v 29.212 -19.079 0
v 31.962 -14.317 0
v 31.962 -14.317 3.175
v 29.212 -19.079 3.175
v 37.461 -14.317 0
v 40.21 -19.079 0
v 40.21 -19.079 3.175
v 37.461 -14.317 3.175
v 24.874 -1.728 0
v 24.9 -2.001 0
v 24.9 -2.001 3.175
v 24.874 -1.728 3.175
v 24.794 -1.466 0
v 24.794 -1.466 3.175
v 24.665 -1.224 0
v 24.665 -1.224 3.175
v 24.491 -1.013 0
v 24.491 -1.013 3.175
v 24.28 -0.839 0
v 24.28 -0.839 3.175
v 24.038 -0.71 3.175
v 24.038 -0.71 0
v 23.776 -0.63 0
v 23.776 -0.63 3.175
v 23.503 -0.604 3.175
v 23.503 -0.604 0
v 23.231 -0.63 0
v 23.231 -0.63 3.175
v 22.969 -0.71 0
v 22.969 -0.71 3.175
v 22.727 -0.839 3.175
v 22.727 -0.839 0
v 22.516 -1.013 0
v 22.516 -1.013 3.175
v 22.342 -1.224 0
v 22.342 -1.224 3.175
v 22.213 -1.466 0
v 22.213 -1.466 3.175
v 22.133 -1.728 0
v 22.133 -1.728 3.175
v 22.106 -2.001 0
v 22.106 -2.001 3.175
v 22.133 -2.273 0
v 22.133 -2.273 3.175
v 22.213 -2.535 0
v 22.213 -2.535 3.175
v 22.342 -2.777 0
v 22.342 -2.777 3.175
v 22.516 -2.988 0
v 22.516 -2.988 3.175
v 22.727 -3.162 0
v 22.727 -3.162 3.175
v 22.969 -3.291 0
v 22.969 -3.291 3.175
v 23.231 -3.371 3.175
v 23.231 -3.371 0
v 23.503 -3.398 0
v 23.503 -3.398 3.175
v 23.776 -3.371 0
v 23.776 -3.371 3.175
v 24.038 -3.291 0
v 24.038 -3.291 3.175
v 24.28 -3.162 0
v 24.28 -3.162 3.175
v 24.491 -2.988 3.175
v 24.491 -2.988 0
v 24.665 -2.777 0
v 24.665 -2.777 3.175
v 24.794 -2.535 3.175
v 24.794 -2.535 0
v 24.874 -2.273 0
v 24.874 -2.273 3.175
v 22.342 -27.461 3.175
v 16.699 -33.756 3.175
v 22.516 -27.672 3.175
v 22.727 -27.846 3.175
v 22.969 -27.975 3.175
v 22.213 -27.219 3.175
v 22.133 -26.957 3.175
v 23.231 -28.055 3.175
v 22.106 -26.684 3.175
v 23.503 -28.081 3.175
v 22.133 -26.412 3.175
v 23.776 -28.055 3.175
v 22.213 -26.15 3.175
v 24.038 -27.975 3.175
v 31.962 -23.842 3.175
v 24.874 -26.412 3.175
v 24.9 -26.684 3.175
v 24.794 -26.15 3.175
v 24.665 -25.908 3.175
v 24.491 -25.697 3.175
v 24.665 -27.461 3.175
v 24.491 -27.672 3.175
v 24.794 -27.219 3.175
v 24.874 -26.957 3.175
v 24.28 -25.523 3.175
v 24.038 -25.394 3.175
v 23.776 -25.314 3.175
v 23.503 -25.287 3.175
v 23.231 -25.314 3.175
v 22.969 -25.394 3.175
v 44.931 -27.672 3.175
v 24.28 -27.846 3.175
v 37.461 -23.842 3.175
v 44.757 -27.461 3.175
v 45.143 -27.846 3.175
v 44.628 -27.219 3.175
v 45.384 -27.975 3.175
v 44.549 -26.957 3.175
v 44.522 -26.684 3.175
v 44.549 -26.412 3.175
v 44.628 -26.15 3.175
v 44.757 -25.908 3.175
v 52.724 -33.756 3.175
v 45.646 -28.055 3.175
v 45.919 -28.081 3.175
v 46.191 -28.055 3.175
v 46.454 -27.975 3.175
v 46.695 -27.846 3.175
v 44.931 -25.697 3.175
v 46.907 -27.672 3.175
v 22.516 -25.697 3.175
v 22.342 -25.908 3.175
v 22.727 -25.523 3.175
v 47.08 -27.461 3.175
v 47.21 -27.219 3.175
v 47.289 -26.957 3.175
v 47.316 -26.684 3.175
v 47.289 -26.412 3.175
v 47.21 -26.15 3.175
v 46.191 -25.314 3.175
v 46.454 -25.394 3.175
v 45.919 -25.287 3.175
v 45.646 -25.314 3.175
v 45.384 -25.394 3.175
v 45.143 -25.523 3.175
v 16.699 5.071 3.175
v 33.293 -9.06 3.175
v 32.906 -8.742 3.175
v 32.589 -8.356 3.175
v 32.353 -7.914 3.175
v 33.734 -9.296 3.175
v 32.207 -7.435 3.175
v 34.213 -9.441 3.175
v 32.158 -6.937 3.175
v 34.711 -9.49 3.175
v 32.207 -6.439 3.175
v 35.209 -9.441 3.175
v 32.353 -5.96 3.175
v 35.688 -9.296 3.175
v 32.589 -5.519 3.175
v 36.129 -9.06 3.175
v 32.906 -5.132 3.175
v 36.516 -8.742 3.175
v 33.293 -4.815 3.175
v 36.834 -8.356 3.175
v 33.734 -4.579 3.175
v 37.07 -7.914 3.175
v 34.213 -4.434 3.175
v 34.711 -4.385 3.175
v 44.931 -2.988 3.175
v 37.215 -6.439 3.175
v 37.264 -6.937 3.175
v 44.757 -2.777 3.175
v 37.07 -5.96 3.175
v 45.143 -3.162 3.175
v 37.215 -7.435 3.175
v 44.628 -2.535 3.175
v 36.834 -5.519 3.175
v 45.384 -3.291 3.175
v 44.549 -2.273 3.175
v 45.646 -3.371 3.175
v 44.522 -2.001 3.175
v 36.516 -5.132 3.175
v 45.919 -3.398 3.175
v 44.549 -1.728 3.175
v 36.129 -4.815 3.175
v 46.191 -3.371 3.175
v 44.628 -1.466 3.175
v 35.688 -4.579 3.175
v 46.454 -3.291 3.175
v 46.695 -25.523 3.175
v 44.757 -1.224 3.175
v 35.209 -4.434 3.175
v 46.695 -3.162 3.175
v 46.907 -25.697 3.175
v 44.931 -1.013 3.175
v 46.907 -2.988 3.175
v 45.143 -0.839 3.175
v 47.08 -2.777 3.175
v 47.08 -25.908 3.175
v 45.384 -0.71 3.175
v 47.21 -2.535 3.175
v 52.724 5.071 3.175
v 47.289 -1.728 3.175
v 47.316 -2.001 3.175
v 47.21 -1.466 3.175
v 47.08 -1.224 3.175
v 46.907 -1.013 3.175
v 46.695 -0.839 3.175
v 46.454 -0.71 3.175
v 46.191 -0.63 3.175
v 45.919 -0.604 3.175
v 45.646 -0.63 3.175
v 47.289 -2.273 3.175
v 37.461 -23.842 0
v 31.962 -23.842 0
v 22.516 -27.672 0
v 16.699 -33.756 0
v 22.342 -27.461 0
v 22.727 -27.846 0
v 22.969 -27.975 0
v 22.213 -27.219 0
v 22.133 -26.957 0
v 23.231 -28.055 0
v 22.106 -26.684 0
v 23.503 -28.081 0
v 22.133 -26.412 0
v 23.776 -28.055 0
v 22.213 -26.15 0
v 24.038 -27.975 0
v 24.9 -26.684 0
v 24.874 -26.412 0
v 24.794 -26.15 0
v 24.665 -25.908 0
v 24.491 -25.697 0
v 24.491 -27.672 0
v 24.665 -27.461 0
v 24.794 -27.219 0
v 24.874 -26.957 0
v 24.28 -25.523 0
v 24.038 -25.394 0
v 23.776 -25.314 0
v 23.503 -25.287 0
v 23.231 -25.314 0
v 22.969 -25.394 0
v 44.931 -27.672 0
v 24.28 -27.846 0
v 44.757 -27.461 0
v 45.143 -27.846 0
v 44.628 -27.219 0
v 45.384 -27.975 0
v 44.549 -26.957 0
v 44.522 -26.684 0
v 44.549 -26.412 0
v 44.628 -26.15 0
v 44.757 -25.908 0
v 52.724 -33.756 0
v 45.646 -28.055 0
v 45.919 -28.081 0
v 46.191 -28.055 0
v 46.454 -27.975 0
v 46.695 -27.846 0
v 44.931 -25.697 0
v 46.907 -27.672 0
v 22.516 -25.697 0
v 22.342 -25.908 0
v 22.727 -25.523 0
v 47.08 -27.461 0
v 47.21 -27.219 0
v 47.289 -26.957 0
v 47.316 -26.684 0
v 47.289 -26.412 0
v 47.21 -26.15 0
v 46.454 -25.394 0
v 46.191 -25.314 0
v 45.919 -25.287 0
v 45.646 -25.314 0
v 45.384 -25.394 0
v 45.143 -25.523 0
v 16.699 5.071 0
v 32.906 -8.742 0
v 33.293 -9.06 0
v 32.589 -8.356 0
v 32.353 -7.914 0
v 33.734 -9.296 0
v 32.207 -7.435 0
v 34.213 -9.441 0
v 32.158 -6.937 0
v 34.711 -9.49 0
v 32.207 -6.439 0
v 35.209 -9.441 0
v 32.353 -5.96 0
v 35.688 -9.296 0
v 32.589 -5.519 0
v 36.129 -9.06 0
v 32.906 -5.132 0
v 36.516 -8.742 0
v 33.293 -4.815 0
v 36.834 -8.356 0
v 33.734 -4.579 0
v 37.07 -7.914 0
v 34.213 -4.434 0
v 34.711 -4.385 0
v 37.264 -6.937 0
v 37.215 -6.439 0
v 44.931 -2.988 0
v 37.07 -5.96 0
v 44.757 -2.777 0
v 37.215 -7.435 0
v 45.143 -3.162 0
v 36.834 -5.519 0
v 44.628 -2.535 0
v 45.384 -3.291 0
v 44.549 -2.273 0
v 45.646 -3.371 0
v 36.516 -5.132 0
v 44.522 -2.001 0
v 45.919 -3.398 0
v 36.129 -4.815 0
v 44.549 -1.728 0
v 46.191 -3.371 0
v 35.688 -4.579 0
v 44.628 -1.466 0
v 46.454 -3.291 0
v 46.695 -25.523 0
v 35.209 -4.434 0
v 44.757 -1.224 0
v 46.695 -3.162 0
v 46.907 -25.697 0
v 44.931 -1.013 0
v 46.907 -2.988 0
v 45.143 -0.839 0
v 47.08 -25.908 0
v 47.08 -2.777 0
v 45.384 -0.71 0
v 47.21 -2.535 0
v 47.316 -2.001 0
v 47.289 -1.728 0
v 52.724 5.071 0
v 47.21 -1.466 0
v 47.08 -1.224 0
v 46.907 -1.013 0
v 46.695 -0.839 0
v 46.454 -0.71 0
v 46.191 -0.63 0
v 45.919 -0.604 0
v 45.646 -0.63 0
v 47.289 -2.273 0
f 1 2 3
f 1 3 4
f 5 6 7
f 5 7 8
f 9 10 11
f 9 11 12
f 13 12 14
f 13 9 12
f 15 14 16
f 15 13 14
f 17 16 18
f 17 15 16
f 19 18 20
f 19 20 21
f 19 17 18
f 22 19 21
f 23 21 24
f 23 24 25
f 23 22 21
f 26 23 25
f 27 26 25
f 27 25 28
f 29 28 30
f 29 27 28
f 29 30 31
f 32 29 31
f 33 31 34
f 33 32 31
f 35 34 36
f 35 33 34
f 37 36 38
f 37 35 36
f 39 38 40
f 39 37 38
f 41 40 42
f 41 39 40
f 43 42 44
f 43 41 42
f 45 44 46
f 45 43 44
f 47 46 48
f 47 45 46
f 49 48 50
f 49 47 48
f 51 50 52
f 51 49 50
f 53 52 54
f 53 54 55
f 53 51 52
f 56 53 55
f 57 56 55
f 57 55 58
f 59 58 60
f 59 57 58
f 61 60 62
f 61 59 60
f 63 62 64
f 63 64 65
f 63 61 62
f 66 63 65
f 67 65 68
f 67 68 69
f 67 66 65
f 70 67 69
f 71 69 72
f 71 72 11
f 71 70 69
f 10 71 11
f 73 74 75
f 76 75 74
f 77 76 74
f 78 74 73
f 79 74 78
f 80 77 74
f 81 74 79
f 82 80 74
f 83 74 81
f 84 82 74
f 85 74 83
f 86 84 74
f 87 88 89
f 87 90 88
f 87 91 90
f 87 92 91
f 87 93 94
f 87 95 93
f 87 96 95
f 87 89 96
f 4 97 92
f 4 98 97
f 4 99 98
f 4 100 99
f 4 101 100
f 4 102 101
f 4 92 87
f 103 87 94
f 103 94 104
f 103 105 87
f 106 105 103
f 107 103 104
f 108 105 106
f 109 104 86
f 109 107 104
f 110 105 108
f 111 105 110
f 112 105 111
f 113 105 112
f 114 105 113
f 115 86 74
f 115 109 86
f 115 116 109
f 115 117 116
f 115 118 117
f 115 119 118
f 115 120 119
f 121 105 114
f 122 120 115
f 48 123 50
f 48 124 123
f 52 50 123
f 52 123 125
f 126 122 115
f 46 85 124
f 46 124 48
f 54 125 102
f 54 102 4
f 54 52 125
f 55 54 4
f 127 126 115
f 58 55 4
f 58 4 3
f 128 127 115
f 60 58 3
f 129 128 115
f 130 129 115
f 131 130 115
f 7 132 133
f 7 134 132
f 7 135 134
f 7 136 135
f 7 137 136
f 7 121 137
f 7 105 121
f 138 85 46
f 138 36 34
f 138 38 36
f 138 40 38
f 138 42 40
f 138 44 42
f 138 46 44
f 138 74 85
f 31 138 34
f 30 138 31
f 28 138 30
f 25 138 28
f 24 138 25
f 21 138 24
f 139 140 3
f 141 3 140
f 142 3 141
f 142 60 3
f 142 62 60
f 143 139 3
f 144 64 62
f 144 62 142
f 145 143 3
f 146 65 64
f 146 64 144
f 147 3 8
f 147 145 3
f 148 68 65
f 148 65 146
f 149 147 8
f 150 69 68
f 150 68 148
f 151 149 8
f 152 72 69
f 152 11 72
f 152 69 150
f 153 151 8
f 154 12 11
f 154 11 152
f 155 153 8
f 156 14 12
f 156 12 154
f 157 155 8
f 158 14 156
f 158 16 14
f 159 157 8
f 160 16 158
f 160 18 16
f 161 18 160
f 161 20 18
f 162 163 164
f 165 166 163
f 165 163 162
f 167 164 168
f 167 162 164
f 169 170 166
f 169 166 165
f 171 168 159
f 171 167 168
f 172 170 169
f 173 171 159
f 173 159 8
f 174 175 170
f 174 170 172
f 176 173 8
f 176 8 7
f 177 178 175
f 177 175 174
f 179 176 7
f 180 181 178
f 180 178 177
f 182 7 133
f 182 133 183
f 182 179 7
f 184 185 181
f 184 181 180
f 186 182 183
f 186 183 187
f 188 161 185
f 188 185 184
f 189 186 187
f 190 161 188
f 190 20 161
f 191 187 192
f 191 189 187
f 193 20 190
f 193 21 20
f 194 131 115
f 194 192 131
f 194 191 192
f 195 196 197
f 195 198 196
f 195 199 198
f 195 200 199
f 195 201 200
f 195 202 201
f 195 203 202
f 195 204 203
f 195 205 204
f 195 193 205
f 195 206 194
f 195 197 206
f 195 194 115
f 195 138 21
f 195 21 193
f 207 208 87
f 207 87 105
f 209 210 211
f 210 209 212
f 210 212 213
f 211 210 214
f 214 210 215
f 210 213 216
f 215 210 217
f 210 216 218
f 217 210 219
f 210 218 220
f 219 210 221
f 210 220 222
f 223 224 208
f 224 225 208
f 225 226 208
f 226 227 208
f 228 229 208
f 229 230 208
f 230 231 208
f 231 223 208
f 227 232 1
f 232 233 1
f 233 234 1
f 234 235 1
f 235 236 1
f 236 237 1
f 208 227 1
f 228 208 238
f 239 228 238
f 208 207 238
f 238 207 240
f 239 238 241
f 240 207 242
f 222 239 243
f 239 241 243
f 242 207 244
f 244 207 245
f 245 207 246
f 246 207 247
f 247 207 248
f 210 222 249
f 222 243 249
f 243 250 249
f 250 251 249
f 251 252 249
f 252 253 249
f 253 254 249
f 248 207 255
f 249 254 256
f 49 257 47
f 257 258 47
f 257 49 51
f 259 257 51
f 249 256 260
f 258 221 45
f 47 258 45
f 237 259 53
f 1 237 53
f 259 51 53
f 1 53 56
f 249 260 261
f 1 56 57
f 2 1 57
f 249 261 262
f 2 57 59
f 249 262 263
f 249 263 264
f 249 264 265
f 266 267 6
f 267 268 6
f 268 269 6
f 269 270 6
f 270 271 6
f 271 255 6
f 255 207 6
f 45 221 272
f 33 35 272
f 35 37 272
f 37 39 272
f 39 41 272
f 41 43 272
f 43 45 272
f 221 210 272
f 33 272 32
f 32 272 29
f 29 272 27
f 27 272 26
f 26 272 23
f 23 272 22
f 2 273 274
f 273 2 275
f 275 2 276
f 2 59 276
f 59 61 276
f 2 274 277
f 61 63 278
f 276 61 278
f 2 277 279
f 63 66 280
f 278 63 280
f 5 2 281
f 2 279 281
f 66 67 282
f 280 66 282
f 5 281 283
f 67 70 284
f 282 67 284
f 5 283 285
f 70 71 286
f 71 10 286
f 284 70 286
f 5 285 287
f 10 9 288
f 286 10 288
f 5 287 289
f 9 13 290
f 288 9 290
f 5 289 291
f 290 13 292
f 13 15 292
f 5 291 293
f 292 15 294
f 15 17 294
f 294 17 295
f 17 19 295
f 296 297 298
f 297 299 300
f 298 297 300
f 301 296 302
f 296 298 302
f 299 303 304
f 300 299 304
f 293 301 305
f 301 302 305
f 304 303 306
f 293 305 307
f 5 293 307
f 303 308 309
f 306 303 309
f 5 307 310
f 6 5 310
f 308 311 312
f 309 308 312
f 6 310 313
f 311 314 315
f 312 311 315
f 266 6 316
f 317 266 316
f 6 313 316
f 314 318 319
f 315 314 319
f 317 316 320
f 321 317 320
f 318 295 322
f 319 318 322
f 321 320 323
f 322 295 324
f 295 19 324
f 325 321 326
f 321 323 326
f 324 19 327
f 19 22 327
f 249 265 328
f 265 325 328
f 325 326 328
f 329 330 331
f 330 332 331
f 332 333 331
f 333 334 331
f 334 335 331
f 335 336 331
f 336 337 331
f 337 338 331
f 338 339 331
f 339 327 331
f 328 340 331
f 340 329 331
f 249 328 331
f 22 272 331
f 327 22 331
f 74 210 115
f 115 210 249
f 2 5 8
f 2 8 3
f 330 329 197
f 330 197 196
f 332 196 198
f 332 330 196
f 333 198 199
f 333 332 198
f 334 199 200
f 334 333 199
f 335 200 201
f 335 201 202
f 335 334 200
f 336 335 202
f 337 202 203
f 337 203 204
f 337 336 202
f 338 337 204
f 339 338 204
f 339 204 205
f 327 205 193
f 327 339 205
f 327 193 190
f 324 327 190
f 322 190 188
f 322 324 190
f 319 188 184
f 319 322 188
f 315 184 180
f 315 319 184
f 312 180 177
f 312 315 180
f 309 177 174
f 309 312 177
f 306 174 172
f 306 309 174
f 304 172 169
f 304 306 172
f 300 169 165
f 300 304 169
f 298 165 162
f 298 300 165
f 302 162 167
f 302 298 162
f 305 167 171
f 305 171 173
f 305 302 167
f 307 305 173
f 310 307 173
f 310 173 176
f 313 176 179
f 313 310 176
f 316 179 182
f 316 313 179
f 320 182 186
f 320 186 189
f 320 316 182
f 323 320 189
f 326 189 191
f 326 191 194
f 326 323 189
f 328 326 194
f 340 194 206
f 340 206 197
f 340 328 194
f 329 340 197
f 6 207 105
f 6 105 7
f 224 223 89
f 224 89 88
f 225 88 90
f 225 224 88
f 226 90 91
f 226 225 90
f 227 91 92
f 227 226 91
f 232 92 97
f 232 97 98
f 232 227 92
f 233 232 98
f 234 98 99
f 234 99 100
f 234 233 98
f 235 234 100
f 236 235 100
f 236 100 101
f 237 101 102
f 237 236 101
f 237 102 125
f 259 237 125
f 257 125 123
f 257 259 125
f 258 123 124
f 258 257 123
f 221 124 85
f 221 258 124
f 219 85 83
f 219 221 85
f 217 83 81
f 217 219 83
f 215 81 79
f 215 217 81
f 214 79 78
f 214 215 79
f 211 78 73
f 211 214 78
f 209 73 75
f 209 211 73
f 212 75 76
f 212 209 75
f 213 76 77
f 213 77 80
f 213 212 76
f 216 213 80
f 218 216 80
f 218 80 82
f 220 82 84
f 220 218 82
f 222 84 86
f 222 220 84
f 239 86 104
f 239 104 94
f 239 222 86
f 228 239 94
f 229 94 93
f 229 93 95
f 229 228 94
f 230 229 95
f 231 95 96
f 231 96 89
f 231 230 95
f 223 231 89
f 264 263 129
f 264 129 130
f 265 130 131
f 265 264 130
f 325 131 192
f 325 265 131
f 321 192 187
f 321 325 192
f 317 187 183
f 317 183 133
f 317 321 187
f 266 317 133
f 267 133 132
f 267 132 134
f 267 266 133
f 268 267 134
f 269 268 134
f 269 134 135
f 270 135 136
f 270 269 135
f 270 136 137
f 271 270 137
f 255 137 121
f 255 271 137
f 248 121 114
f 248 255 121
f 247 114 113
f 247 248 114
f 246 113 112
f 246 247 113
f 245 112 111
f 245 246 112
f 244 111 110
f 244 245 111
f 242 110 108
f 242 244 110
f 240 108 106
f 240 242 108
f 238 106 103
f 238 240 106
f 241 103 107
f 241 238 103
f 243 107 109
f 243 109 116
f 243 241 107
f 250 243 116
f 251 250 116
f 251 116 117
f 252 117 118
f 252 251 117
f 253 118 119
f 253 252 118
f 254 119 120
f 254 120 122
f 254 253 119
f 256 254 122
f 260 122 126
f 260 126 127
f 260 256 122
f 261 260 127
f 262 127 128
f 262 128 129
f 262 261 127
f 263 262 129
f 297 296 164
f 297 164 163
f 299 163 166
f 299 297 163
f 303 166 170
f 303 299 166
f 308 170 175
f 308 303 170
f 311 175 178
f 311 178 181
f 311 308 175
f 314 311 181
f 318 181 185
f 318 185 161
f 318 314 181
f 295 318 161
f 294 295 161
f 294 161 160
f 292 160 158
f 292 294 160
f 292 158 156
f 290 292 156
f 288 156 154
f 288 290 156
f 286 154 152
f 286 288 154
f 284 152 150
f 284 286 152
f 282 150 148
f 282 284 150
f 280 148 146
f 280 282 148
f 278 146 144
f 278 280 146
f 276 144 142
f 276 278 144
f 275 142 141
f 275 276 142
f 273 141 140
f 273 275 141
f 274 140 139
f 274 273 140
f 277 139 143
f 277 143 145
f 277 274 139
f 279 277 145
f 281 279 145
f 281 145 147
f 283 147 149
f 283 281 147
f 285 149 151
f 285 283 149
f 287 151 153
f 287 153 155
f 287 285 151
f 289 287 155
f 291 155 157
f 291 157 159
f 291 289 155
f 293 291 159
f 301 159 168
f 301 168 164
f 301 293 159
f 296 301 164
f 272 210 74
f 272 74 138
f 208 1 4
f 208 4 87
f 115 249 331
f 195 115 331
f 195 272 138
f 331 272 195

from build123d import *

# Parameters (mm, degrees)
SKETCH1_W           = 36.024962638
SKETCH1_H           = 38.826904176
SKETCH1_R           = 1.397
SKETCH1_R_2         = 2.5527
BOSS_EXTRUDE1_DEPTH = 3.175


with BuildPart() as part:
    # Sketch1 → Boss-Extrude1 (new body)
    with BuildSketch(Plane.XY):
        with Locations((34.711147671, -14.342506761)):
            Rectangle(SKETCH1_W, SKETCH1_H)
        with Locations((45.918913825, -2.000621413)):
            Circle(SKETCH1_R, mode=Mode.SUBTRACT)
        with Locations((23.503381517, -2.000621413)):
            Circle(SKETCH1_R, mode=Mode.SUBTRACT)
        with Locations((23.503381517, -26.684392109)):
            Circle(SKETCH1_R, mode=Mode.SUBTRACT)
        with Locations((45.918913825, -26.684392109)):
            Circle(SKETCH1_R, mode=Mode.SUBTRACT)
        with Locations((34.711147671, -6.937375552)):
            Circle(SKETCH1_R_2, mode=Mode.SUBTRACT)
        Polygon((40.210408985, -19.079122219), (37.460778328, -14.316622219), (31.961517014, -14.316622219), (29.211886357, -19.079122219), (31.961517014, -23.841622219), (37.460778328, -23.841622219), align=None, mode=Mode.SUBTRACT)
    extrude(amount=BOSS_EXTRUDE1_DEPTH)


solid = part.part
